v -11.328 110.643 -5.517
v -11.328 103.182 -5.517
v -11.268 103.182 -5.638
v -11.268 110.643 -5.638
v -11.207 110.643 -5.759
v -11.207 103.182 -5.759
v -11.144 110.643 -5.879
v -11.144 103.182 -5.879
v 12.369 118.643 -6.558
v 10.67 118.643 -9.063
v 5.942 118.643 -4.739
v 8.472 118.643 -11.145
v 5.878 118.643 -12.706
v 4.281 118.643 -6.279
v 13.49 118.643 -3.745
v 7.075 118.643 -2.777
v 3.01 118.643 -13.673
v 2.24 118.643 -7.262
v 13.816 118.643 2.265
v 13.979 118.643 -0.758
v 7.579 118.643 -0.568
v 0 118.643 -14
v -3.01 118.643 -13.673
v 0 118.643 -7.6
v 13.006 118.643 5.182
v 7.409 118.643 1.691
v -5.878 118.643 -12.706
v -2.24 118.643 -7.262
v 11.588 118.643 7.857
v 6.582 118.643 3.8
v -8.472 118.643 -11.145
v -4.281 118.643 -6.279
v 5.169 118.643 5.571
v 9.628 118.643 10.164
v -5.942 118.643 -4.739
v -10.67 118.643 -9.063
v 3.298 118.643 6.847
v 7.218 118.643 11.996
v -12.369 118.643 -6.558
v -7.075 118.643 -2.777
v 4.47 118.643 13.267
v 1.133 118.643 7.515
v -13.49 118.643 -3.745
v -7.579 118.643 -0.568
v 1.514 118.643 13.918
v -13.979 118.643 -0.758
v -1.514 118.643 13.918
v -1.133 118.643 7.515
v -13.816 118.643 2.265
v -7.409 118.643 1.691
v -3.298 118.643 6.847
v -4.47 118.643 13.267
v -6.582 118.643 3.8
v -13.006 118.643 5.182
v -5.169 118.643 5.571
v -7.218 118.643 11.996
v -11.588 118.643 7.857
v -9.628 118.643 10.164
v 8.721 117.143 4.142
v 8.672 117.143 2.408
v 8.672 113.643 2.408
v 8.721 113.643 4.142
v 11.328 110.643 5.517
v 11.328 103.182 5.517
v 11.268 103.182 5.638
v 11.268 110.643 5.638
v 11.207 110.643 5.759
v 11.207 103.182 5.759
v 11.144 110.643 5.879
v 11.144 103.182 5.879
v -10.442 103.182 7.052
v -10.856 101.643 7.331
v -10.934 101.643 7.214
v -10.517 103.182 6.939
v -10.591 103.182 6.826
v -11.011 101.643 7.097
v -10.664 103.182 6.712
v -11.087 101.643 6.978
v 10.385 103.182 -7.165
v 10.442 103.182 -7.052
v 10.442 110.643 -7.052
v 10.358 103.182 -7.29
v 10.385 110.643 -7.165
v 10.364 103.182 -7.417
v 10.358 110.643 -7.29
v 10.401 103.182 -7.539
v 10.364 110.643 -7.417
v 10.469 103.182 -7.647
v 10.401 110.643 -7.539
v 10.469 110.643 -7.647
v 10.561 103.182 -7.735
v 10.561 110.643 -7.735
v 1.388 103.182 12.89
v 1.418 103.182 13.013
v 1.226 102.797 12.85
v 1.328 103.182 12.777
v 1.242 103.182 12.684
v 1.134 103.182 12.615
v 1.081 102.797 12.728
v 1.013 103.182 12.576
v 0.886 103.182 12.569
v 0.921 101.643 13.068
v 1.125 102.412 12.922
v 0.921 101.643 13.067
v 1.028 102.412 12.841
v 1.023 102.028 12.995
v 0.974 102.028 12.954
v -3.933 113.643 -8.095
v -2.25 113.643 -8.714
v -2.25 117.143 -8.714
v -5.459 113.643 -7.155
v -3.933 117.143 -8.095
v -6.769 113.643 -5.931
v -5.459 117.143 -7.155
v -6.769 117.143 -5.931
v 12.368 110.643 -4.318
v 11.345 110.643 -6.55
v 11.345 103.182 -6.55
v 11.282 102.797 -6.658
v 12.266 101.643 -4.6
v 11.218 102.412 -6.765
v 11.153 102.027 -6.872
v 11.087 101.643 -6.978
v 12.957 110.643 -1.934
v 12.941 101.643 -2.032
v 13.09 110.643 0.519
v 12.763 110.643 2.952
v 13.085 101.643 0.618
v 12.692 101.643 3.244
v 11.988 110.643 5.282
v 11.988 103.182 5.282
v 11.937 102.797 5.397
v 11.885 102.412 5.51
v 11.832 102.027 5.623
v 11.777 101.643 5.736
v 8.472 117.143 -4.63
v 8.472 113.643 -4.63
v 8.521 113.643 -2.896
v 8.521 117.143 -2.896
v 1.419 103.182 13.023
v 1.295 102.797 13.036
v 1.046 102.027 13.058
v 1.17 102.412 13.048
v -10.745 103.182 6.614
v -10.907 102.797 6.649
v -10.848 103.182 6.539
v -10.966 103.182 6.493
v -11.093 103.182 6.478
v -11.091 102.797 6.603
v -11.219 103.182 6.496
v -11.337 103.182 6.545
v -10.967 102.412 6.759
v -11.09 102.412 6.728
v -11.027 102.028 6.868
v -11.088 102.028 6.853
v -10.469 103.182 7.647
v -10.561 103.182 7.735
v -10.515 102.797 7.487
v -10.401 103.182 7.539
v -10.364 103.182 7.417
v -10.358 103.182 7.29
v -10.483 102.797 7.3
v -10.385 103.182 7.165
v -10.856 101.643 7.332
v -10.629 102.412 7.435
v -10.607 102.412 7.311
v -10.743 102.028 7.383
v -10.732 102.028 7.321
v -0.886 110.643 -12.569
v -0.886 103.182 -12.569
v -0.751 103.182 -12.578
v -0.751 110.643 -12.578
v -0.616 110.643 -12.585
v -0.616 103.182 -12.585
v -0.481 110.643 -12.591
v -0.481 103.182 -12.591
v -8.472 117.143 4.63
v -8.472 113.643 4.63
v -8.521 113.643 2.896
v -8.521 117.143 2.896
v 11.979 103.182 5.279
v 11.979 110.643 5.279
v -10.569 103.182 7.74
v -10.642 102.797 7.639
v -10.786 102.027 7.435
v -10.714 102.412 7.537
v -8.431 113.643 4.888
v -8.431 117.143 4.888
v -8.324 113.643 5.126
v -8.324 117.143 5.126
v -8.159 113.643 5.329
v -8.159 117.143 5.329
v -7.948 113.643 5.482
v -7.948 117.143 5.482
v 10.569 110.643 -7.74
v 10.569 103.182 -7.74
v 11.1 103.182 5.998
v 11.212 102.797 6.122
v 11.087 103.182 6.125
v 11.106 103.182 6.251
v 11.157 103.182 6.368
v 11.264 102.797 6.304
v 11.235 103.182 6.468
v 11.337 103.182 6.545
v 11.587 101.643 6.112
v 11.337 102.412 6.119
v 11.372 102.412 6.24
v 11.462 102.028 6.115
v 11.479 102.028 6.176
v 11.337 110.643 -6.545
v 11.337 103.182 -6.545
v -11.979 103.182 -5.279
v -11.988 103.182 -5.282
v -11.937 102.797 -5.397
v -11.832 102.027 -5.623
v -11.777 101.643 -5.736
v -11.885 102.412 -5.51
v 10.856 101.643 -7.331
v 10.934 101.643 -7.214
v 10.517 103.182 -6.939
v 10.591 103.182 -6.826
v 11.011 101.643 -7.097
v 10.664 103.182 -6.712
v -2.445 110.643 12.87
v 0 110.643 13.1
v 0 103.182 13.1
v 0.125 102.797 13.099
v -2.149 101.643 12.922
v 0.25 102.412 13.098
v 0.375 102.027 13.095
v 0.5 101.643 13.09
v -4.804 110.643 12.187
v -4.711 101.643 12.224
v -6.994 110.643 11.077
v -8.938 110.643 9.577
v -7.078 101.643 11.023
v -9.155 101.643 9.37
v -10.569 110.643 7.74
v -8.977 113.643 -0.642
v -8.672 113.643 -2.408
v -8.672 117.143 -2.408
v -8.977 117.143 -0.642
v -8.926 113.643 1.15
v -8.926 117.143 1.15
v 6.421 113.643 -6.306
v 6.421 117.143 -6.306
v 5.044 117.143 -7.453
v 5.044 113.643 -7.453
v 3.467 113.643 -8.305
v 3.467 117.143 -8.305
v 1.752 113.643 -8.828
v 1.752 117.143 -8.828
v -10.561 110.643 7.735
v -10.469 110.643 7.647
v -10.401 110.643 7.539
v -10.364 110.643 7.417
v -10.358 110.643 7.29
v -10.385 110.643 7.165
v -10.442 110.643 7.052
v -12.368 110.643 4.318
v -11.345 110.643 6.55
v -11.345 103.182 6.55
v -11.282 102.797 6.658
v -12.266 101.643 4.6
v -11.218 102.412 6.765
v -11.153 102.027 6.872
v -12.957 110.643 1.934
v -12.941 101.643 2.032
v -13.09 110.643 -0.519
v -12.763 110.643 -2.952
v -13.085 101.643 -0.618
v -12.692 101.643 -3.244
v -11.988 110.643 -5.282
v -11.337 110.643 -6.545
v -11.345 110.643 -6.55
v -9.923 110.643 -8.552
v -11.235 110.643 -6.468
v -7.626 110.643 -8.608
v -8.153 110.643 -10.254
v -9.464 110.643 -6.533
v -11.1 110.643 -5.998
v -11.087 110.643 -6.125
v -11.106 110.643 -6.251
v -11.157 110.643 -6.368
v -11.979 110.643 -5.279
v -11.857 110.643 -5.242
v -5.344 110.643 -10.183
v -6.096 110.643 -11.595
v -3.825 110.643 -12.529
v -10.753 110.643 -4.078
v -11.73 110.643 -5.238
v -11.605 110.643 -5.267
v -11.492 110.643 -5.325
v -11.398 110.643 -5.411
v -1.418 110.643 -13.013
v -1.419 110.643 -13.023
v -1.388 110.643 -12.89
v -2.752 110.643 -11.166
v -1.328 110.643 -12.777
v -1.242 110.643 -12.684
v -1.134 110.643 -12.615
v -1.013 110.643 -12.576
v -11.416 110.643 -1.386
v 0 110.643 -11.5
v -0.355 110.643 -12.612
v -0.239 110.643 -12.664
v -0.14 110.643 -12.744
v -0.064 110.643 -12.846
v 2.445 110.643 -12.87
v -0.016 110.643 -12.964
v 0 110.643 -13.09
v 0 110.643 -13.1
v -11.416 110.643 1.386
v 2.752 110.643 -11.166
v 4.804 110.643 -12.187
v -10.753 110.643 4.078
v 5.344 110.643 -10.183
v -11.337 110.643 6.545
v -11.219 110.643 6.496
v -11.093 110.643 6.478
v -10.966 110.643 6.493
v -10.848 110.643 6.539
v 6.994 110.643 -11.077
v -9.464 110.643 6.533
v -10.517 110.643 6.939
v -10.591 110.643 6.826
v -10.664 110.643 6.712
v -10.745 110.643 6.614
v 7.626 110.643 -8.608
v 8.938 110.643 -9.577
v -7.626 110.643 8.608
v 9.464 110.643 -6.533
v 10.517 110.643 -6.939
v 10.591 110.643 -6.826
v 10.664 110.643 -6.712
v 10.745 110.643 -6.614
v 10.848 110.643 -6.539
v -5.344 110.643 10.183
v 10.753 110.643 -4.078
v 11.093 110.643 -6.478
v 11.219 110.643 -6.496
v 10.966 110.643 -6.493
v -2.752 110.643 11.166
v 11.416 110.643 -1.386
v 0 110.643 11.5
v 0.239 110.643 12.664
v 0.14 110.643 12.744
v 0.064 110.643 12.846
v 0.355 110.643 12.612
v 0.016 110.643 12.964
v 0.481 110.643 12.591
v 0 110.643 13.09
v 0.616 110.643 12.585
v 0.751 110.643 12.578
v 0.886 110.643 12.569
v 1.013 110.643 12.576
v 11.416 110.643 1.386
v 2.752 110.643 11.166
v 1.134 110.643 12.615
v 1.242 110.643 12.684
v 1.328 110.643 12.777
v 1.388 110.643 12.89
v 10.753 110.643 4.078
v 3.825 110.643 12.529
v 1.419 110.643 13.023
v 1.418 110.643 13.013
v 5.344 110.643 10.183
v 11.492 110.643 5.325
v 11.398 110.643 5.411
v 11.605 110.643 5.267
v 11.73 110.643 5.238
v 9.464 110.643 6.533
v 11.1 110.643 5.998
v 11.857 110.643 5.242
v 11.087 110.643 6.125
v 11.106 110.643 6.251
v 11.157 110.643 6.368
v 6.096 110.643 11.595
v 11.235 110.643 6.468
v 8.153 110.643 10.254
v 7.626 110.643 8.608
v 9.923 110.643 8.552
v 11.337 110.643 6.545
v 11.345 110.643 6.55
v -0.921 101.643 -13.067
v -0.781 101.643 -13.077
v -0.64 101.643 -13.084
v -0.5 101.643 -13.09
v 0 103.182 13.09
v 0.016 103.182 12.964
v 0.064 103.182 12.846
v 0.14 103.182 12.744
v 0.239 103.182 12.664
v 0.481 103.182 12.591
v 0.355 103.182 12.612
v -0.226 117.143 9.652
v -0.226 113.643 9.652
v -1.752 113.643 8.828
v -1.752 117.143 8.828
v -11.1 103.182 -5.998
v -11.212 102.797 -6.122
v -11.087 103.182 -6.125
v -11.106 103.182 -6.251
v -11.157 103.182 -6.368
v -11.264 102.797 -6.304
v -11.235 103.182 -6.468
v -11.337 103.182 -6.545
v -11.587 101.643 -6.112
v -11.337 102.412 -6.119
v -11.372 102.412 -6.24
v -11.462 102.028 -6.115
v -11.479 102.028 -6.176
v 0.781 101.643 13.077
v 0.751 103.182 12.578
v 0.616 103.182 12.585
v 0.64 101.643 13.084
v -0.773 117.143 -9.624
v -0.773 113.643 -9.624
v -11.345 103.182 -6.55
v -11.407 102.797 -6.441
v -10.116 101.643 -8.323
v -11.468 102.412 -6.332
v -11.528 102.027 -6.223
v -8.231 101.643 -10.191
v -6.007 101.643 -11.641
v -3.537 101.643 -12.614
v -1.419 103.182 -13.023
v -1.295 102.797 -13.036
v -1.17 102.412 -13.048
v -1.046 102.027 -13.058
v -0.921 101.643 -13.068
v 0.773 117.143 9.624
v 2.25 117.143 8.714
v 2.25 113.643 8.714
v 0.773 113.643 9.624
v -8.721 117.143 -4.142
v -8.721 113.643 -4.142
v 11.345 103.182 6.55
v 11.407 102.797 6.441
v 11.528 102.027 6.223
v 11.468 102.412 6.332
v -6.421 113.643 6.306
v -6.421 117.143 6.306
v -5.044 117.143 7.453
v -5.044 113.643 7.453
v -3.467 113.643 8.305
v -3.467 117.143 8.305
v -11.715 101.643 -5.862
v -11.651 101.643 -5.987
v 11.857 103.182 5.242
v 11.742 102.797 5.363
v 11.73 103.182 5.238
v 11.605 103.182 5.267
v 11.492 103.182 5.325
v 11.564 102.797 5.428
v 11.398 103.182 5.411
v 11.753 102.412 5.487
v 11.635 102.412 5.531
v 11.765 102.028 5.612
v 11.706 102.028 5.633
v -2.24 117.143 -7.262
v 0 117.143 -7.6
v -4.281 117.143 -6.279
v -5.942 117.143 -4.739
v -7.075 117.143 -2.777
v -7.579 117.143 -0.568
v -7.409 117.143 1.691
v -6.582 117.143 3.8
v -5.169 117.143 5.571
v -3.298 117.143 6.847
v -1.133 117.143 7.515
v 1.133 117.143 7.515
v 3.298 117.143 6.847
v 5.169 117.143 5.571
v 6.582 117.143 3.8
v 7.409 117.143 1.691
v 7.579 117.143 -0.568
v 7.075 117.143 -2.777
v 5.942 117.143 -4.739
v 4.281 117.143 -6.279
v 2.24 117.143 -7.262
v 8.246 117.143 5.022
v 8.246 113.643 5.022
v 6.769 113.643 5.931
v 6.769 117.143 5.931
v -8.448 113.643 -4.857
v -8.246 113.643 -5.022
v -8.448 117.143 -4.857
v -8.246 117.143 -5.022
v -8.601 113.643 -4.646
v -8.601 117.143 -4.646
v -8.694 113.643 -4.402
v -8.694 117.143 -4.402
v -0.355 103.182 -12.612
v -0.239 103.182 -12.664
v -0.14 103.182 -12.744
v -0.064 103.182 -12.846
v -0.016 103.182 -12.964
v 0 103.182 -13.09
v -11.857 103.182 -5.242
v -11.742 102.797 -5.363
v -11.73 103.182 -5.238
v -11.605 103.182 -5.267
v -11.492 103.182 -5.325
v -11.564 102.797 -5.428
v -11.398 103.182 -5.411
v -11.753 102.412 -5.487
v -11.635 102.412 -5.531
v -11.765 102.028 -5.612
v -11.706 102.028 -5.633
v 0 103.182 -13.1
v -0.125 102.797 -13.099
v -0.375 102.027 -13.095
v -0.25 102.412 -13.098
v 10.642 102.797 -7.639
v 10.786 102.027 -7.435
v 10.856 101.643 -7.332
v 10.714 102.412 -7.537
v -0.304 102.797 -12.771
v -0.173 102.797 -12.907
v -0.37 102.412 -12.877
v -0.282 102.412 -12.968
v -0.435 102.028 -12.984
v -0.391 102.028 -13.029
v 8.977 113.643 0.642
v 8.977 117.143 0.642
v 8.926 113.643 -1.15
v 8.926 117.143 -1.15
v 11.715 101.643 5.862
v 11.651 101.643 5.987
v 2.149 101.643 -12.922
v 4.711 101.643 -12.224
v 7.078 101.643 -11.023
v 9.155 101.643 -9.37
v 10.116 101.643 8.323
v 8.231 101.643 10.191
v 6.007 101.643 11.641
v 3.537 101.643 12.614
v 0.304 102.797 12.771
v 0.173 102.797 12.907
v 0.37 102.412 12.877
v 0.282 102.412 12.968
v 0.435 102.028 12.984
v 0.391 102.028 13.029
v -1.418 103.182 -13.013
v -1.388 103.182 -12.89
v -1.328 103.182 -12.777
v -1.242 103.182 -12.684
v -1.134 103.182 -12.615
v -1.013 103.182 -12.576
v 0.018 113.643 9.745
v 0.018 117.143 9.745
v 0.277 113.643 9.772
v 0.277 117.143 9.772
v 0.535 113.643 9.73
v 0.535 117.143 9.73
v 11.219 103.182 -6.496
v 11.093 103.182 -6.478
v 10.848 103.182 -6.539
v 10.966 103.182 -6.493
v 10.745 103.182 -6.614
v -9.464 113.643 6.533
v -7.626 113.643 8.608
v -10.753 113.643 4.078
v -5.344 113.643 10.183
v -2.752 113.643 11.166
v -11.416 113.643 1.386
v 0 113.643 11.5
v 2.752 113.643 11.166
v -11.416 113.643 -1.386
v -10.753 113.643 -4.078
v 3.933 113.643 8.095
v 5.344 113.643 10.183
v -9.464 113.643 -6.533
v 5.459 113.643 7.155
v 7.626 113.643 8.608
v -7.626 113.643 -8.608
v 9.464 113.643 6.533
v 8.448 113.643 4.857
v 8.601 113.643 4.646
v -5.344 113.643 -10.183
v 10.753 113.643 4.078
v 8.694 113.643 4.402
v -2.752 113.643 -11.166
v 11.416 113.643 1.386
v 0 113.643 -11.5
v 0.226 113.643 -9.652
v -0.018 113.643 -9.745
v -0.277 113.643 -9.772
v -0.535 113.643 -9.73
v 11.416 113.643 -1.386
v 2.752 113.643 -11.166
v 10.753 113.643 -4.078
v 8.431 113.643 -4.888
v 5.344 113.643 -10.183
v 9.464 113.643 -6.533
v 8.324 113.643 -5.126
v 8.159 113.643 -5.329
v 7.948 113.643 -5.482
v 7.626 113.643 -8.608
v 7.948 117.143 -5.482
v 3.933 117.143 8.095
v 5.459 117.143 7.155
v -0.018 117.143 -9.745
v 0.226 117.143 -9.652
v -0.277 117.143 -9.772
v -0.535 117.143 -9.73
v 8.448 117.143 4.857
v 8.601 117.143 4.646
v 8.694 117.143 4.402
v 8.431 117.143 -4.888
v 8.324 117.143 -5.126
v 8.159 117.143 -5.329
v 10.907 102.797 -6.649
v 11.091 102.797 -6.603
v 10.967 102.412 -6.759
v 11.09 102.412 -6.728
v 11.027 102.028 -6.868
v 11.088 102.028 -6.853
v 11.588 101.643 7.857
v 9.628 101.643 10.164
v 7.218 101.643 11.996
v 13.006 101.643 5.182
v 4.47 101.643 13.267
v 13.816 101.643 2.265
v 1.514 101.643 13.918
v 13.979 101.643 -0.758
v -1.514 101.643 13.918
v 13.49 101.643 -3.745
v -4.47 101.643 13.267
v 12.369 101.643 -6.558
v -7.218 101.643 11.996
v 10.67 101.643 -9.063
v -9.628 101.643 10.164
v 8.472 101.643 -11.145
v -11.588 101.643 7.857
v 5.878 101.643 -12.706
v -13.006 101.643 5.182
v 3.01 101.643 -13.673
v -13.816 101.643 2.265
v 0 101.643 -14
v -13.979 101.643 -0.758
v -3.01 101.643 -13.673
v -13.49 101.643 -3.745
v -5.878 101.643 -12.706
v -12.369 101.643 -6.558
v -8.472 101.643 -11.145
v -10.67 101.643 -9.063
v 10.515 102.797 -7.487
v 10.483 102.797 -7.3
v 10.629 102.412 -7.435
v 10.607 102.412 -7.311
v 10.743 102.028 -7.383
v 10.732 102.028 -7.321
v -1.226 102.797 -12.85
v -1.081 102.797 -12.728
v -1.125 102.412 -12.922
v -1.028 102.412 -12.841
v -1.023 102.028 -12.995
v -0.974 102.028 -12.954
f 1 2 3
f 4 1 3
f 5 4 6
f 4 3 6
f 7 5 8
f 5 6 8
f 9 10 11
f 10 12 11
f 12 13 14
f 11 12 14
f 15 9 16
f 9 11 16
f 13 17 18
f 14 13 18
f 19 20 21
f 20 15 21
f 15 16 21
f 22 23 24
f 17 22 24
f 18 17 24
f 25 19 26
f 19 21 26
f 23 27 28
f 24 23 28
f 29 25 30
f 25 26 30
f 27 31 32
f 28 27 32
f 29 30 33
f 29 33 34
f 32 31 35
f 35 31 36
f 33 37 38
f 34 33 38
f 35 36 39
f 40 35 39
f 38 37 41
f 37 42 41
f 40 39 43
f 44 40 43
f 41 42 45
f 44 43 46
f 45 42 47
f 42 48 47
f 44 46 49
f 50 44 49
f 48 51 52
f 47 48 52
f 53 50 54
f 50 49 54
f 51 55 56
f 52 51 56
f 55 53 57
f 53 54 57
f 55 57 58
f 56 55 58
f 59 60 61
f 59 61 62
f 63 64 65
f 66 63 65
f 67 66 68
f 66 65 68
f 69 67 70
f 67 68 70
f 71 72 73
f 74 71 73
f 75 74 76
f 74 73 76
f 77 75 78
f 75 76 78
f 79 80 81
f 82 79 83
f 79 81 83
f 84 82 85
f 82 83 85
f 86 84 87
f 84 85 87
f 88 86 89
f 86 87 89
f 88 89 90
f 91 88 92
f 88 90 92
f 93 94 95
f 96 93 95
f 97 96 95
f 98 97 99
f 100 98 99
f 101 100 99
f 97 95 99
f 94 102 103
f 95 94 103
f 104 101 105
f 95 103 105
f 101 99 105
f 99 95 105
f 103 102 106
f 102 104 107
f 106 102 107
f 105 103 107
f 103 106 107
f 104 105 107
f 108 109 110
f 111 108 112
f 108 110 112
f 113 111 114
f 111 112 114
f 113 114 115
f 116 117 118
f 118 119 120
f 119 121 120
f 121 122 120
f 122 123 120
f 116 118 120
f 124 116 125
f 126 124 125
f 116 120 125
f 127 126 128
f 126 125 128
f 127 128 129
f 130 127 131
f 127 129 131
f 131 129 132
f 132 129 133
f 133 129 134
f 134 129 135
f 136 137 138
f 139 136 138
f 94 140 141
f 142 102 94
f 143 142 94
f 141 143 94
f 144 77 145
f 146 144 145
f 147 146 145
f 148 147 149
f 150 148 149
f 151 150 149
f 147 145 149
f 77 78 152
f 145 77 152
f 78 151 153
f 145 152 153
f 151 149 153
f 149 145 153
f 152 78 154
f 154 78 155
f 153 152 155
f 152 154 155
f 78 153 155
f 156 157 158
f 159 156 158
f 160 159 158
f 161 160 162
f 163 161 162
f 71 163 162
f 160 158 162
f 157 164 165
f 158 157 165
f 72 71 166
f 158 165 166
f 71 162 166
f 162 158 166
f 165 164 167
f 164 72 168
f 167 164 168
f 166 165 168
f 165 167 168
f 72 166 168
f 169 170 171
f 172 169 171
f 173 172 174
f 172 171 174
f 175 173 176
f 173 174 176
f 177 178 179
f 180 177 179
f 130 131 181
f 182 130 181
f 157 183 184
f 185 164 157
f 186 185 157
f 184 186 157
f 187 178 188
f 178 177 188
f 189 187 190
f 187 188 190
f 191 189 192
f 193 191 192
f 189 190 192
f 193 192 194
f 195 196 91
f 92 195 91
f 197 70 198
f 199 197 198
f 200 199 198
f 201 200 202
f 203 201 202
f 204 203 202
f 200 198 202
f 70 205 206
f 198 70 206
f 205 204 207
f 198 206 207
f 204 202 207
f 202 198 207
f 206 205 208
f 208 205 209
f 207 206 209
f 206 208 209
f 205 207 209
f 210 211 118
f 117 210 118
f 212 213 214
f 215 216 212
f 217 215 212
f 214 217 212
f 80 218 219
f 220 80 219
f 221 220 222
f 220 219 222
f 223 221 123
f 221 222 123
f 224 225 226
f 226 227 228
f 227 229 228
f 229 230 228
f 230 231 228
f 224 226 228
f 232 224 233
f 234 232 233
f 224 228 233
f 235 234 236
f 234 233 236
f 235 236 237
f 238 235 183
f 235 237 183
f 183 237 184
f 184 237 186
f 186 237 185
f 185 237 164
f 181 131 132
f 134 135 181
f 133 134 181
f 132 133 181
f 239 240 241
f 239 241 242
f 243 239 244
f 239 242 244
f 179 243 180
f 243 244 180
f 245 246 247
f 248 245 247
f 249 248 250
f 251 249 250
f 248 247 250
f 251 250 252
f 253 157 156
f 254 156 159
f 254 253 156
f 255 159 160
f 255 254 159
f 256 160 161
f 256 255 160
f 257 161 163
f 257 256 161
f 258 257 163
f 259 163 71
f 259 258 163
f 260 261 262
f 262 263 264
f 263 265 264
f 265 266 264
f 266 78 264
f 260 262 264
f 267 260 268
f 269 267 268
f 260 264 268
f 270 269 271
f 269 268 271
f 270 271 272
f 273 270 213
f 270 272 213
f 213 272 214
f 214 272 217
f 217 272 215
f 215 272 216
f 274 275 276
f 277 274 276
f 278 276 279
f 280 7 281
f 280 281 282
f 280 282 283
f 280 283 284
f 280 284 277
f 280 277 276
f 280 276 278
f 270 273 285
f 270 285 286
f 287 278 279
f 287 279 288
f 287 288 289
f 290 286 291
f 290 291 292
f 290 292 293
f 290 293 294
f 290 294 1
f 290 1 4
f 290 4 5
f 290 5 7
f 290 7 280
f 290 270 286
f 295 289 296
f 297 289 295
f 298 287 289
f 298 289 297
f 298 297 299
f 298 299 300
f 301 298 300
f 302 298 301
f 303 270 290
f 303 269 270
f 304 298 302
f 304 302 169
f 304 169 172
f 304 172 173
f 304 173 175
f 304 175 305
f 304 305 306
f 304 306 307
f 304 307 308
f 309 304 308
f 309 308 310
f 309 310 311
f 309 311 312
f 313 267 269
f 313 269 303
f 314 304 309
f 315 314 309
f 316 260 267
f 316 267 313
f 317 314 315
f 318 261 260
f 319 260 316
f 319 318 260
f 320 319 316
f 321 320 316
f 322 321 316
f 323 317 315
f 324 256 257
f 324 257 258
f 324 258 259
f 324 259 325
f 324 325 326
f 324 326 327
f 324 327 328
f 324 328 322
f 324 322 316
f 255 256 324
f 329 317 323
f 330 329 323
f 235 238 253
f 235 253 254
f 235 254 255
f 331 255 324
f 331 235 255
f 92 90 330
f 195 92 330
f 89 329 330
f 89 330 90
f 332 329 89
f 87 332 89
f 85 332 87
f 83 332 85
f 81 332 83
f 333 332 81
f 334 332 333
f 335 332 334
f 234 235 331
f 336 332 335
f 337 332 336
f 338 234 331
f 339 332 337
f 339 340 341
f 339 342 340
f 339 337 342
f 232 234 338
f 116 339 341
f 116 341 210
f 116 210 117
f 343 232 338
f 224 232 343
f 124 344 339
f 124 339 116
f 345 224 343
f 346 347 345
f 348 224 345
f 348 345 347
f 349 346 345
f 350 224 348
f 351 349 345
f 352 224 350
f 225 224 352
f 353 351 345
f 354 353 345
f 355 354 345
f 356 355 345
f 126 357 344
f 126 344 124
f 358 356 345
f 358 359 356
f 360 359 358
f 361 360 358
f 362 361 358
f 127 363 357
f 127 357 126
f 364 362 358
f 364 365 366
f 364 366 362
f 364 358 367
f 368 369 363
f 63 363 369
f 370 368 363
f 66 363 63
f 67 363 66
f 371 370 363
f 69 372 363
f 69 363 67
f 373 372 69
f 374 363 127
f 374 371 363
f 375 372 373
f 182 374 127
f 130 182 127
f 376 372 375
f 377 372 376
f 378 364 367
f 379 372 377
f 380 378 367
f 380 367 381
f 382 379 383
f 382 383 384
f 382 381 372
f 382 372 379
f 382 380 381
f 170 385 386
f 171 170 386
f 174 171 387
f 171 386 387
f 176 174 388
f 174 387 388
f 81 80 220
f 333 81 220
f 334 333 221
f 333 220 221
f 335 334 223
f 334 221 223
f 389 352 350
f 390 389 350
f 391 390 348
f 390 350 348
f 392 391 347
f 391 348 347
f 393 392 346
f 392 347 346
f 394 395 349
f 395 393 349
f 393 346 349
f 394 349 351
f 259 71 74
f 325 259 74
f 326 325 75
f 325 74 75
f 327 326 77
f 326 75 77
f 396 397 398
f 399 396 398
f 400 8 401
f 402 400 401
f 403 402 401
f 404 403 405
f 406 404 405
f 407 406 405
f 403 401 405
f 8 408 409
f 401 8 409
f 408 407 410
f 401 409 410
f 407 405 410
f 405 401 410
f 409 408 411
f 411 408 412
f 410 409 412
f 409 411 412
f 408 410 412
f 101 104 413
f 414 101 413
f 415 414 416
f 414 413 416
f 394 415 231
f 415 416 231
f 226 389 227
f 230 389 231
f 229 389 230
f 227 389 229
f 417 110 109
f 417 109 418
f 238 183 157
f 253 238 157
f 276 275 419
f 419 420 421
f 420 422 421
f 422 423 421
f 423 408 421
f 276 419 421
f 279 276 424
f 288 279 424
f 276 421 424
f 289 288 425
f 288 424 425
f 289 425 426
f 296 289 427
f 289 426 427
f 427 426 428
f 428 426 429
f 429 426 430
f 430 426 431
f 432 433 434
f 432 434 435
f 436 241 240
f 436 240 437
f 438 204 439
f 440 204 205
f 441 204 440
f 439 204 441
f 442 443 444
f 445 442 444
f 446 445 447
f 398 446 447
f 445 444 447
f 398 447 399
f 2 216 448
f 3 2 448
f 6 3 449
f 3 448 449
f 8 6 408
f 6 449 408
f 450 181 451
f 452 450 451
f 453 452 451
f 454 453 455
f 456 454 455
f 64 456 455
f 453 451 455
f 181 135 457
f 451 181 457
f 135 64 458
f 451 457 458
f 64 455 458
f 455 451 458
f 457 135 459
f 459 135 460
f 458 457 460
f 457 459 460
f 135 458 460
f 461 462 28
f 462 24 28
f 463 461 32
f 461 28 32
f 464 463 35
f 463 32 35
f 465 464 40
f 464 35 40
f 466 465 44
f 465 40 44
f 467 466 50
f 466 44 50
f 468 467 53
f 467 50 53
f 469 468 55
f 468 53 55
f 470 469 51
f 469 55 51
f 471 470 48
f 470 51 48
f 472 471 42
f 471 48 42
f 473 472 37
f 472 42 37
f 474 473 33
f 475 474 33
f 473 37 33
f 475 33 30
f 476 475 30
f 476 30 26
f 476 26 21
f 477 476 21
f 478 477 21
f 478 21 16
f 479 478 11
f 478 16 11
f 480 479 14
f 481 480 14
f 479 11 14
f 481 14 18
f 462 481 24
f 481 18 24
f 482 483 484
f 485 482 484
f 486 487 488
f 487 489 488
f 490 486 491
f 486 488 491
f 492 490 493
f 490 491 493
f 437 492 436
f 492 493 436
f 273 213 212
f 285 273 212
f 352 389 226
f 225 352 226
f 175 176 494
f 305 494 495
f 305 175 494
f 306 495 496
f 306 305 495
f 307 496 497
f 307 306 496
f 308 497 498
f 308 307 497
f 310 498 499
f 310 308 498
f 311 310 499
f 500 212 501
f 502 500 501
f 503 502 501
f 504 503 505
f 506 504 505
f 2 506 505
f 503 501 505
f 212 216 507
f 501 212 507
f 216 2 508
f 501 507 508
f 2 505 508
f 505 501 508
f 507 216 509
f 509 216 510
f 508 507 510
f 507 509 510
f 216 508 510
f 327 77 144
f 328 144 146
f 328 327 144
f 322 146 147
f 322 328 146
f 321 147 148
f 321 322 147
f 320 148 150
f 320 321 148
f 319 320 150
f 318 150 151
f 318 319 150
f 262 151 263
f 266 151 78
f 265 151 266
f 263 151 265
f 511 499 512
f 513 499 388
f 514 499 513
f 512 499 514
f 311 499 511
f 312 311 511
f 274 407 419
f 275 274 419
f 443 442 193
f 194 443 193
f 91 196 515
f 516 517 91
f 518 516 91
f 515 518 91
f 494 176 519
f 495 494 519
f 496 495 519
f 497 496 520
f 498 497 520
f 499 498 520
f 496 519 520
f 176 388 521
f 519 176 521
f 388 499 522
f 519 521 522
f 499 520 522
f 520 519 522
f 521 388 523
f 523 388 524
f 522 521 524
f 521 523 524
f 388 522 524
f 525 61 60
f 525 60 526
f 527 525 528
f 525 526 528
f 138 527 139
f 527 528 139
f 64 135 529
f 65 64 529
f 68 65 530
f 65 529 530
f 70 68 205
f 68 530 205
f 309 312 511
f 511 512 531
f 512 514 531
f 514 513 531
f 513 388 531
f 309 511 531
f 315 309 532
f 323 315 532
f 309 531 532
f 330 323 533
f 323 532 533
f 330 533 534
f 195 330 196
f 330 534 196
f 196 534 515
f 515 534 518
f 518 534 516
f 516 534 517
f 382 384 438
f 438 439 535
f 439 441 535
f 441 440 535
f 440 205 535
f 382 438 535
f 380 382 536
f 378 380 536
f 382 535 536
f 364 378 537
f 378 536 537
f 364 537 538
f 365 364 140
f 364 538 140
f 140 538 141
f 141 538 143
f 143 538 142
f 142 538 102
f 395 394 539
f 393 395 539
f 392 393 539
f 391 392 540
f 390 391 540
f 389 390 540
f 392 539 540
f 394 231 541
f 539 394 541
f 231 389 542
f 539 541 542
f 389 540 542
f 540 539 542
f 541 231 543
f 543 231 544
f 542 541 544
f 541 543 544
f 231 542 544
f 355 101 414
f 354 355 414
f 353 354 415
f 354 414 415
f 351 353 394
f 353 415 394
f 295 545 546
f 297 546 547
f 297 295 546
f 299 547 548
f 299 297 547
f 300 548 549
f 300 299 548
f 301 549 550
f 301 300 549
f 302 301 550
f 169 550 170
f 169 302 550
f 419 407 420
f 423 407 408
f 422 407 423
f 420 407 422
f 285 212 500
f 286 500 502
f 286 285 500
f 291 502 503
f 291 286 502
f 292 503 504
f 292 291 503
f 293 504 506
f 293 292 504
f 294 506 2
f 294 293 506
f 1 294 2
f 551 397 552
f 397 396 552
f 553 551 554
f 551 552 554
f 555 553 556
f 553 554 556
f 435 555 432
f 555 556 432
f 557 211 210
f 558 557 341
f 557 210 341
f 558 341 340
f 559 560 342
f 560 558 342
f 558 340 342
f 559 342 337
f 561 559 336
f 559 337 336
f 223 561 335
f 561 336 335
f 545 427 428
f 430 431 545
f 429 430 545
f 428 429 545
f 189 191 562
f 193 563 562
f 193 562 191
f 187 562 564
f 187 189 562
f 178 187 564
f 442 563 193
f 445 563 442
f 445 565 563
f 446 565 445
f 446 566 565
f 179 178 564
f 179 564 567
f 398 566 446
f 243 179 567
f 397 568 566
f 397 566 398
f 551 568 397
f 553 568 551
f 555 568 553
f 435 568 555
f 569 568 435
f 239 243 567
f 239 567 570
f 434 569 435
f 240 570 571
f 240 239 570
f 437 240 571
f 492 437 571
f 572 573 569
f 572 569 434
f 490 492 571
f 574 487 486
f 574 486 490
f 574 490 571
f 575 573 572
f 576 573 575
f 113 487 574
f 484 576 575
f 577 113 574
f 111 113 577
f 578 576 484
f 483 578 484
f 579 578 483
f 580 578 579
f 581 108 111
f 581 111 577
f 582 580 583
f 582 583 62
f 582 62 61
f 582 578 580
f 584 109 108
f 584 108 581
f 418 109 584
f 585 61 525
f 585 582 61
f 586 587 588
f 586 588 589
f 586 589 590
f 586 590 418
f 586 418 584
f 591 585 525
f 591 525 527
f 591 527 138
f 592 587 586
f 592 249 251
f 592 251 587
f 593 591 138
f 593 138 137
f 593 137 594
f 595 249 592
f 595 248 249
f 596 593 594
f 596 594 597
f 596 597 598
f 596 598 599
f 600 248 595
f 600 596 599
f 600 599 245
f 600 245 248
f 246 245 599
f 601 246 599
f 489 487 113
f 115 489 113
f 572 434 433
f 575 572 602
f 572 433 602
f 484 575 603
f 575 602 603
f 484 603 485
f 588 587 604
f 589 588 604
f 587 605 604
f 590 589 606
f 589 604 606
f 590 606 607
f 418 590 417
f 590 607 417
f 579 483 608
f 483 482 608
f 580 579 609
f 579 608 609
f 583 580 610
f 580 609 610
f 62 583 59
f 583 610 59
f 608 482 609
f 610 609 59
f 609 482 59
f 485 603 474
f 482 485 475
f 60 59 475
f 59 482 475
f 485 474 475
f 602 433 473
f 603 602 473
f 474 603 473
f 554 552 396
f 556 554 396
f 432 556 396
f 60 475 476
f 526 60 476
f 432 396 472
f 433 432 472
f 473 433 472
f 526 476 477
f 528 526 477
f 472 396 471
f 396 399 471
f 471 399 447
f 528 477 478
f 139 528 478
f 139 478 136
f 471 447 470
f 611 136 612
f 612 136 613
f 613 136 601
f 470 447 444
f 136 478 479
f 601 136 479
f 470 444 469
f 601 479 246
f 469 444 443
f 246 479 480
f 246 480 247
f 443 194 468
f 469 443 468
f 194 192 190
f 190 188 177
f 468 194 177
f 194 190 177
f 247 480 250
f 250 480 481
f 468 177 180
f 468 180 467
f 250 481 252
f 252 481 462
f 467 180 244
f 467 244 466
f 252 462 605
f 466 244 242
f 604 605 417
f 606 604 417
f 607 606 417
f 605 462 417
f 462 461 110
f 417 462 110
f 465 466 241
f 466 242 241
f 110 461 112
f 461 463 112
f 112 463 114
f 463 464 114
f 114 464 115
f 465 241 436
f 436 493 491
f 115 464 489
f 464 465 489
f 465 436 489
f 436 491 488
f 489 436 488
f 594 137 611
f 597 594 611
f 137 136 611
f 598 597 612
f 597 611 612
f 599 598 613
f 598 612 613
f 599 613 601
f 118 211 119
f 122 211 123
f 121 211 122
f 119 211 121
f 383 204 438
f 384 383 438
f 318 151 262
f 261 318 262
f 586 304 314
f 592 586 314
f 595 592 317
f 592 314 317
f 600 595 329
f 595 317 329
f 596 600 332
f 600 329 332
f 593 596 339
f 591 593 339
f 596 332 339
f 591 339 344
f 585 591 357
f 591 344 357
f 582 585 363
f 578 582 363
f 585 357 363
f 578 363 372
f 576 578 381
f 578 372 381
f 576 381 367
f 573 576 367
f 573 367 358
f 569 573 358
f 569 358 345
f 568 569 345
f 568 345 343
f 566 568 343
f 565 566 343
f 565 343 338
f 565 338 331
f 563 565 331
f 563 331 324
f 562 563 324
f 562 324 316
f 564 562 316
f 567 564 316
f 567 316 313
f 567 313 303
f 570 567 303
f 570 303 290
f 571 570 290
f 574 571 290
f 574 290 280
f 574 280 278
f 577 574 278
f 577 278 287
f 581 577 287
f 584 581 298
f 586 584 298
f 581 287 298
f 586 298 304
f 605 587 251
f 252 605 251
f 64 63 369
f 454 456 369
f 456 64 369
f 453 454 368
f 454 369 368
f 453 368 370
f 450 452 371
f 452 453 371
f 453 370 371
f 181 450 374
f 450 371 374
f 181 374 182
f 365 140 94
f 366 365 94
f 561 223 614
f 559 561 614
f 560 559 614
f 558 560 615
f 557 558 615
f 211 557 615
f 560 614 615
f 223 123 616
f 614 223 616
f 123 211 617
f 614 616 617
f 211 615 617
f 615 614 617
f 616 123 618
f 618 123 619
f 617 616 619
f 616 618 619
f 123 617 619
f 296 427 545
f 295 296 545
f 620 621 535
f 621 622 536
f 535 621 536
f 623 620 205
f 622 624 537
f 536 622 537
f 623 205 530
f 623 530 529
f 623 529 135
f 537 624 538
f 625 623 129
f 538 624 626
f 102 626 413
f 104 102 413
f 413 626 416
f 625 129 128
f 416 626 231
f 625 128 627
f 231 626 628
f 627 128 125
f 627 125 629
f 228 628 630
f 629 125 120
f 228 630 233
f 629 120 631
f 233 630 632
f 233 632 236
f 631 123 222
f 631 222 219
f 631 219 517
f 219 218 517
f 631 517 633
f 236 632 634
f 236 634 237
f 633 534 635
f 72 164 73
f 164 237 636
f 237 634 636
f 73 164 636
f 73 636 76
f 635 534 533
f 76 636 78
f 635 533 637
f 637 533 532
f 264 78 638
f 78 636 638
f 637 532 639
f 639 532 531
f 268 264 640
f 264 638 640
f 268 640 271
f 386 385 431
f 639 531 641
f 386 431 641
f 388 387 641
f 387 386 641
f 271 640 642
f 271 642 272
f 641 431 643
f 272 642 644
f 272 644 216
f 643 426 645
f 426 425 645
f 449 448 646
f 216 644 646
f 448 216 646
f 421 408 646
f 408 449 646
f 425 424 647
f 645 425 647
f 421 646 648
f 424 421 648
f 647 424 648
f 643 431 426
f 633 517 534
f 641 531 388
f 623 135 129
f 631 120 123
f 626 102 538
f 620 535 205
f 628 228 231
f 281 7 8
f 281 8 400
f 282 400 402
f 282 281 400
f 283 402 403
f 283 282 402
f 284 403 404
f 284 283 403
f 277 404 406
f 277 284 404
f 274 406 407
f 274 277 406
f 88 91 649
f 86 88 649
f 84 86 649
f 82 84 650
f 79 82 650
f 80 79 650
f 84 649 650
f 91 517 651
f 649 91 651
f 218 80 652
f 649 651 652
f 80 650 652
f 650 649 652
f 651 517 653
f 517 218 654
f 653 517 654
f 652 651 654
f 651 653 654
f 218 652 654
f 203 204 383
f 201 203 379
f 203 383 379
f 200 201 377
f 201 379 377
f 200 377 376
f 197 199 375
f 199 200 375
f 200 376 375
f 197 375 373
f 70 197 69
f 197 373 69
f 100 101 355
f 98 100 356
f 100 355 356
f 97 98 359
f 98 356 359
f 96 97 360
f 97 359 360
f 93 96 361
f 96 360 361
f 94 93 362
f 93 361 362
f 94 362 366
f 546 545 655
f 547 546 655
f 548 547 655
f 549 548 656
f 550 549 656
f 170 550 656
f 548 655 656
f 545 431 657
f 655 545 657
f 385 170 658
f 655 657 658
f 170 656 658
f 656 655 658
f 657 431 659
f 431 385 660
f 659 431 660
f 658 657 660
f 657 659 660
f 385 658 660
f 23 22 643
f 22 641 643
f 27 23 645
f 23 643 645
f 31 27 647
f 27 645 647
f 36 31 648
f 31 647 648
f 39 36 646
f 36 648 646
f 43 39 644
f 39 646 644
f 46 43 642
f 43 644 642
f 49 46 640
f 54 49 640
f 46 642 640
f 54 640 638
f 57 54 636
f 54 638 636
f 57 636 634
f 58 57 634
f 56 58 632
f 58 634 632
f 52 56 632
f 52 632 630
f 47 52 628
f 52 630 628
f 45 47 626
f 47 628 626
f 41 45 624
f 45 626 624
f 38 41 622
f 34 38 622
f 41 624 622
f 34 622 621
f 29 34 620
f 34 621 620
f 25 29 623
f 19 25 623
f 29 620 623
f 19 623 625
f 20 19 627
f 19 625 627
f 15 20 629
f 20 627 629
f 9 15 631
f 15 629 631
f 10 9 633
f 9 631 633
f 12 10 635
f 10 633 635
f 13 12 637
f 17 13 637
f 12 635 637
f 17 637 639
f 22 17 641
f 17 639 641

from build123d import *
from OCP.BRepFilletAPI import BRepFilletAPI_MakeChamfer

# Parameters (mm, degrees)
CUT_EXTRUDE_1_DEPTH  = 15.5
SKETCH_4_R           = 11.5
CUT_EXTRUDE_9_DEPTH  = 12
CUT_EXTRUDE_10_DEPTH = 9
FILLET_1_R           = 1
FILLET_2_R           = 0.5
CHAMFER_1_SIZE       = 1.538841769
CHAMFER_1_SIZE_2     = 0.5


with BuildPart() as part:
    # Эскиз1 → Повернуть1 (revolve)
    with BuildSketch(Plane.XY, mode=Mode.PRIVATE) as revolve_1_sk:
        Polygon((7.6, 118.642857143), (14, 118.642857143), (14, 101.642857143), (9, 101.642857143), (9, 117.142857143), (7.6, 117.142857143), align=None)
    revolve(revolve_1_sk.sketch.rotate(Axis((0, 0, 0), (0, 1, 0)), 90), axis=Axis((0, 0, 0), (0, 1, 0)))

    # Эскиз2 → Вырез-Вытянуть1 (cut)
    with BuildSketch(Plane.XZ.offset(-101.642857143)):
        Polygon((0.281764878, 9.926426441), (-8.455655027, 5.207228763), (-8.737419906, -4.719197678), (-0.281764878, -9.926426441), (8.455655027, -5.207228763), (8.737419906, 4.719197678), align=None)
    extrude(amount=-CUT_EXTRUDE_1_DEPTH, mode=Mode.SUBTRACT)

    # Эскиз4 → Вырез-Вытянуть9 (cut)
    with BuildSketch(Plane.XZ.offset(-101.642857143)):
        with Locations(Location((0, 0, 0), (0, 0, 270))):
            Circle(SKETCH_4_R)
    extrude(amount=-CUT_EXTRUDE_9_DEPTH, mode=Mode.SUBTRACT)

    # Эскиз5 → Вырез-Вытянуть10 (cut)
    with BuildSketch(Plane.XZ.offset(-101.642857143)):
        with BuildLine():
            Line((0, 12.6), (0, 13.1))
            ThreePointArc((0, 13.1), (-5.924928182, 11.683545097), (-10.568574903, 7.740492524))
            Line((-10.568574903, 7.740492524), (-10.165194182, 7.445053878))
            ThreePointArc((-10.165194182, 7.445053878), (-10.554097478, 6.882661289), (-10.911920088, 6.3))
            Line((-10.911920088, 6.3), (-11.34493279, 6.55))
            ThreePointArc((-11.34493279, 6.55), (-13.080710951, 0.710634227), (-11.987750615, -5.282408086))
            Line((-11.987750615, -5.282408086), (-11.530202882, -5.080789457))
            ThreePointArc((-11.530202882, -5.080789457), (-11.237608261, -5.698785885), (-10.911920088, -6.3))
            Line((-10.911920088, -6.3), (-11.34493279, -6.55))
            ThreePointArc((-11.34493279, -6.55), (-7.155782769, -10.97291087), (-1.419175712, -13.02290061))
            Line((-1.419175712, -13.02290061), (-1.3650087, -12.525843335))
            ThreePointArc((-1.3650087, -12.525843335), (-0.683510783, -12.581447175), (0, -12.6))
            Line((0, -12.6), (0, -13.1))
            ThreePointArc((0, -13.1), (5.924928182, -11.683545097), (10.568574903, -7.740492524))
            Line((10.568574903, -7.740492524), (10.165194182, -7.445053878))
            ThreePointArc((10.165194182, -7.445053878), (10.554097478, -6.882661289), (10.911920088, -6.3))
            Line((10.911920088, -6.3), (11.34493279, -6.55))
            ThreePointArc((11.34493279, -6.55), (13.080710951, -0.710634227), (11.987750615, 5.282408086))
            Line((11.987750615, 5.282408086), (11.530202882, 5.080789457))
            ThreePointArc((11.530202882, 5.080789457), (11.237608261, 5.698785885), (10.911920088, 6.3))
            Line((10.911920088, 6.3), (11.34493279, 6.55))
            ThreePointArc((11.34493279, 6.55), (7.155782769, 10.97291087), (1.419175712, 13.02290061))
            Line((1.419175712, 13.02290061), (1.3650087, 12.525843335))
            ThreePointArc((1.3650087, 12.525843335), (0.683510783, 12.581447175), (0, 12.6))
        make_face()
    extrude(amount=-CUT_EXTRUDE_10_DEPTH, mode=Mode.SUBTRACT)

    # Скругление1
    fillet_1_edges = [part.edges().sort_by_distance(p)[0] for p in [
        (-8.455655027, 115.392857143, 5.207228763),
        (0.281764878, 115.392857143, 9.926426441),
        (8.737419906, 115.392857143, 4.719197678),
        (8.455655027, 115.392857143, -5.207228763),
        (-0.281764878, 115.392857143, -9.926426441),
        (-8.737419906, 115.392857143, -4.719197678),
    ]]
    fillet(fillet_1_edges, radius=FILLET_1_R)

    # Скругление2
    fillet_2_edges = [part.edges().sort_by_distance(p)[0] for p in [
        (0, 106.142857143, 12.6),
        (1.3650087, 106.142857143, 12.525843335),
        (10.911920088, 106.142857143, 6.3),
        (11.530202882, 106.142857143, 5.080789457),
        (10.911920088, 106.142857143, -6.3),
        (10.165194182, 106.142857143, -7.445053878),
        (0, 106.142857143, -12.6),
        (-1.3650087, 106.142857143, -12.525843335),
        (-10.911920088, 106.142857143, -6.3),
        (-11.530202882, 106.142857143, -5.080789457),
        (-10.911920088, 106.142857143, 6.3),
        (-10.165194182, 106.142857143, 7.445053878),
    ]]
    fillet(fillet_2_edges, radius=FILLET_2_R)

    # Фаска1
    chamfer_1_edges_1 = [part.edges().sort_by_distance(p)[0] for p in [
        (-10.564724448, 101.642857143, 7.737672426),
    ]]
    chamfer_1_side_1 = [part.faces().sort_by_distance(p)[0] for p in [
        (-10.564724448, 101.652857143, 7.737672426),
    ]]
    chamfer_1_edges_2 = [part.edges().sort_by_distance(p)[0] for p in [
        (-11.983383111, 101.642857143, -5.280483543),
    ]]
    chamfer_1_side_2 = [part.faces().sort_by_distance(p)[0] for p in [
        (-11.983383111, 101.652857143, -5.280483543),
    ]]
    chamfer_1_edges_3 = [part.edges().sort_by_distance(p)[0] for p in [
        (-1.418658663, 101.642857143, -13.018155968),
    ]]
    chamfer_1_side_3 = [part.faces().sort_by_distance(p)[0] for p in [
        (-1.418658663, 101.652857143, -13.018155968),
    ]]
    chamfer_1_edges_4 = [part.edges().sort_by_distance(p)[0] for p in [
        (10.564724448, 101.642857143, -7.737672426),
    ]]
    chamfer_1_side_4 = [part.faces().sort_by_distance(p)[0] for p in [
        (10.564724448, 101.652857143, -7.737672426),
    ]]
    chamfer_1_edges_5 = [part.edges().sort_by_distance(p)[0] for p in [
        (11.983383111, 101.642857143, 5.280483543),
    ]]
    chamfer_1_side_5 = [part.faces().sort_by_distance(p)[0] for p in [
        (11.983383111, 101.652857143, 5.280483543),
    ]]
    chamfer_1_edges_6 = [part.edges().sort_by_distance(p)[0] for p in [
        (1.418658663, 101.642857143, 13.018155968),
    ]]
    chamfer_1_side_6 = [part.faces().sort_by_distance(p)[0] for p in [
        (1.418658663, 101.652857143, 13.018155968),
    ]]
    chamfer_1_edges_7 = [part.edges().sort_by_distance(p)[0] for p in [
        (10.554097478, 101.642857143, -6.882661289),
    ]]
    chamfer_1_side_7 = [part.faces().sort_by_distance(p)[0] for p in [
        (10.554097478, 101.652857143, -6.882661289),
    ]]
    chamfer_1_edges_8 = [part.edges().sort_by_distance(p)[0] for p in [
        (0.683510783, 101.642857143, 12.581447175),
    ]]
    chamfer_1_side_8 = [part.faces().sort_by_distance(p)[0] for p in [
        (0.683510783, 101.652857143, 12.581447175),
    ]]
    chamfer_1_edges_9 = [part.edges().sort_by_distance(p)[0] for p in [
        (11.340799483, 101.642857143, 6.547613634),
    ]]
    chamfer_1_side_9 = [part.faces().sort_by_distance(p)[0] for p in [
        (11.340799483, 101.652857143, 6.547613634),
    ]]
    chamfer_1_edges_10 = [part.edges().sort_by_distance(p)[0] for p in [
        (11.237608261, 101.642857143, 5.698785885),
    ]]
    chamfer_1_side_10 = [part.faces().sort_by_distance(p)[0] for p in [
        (11.237608261, 101.652857143, 5.698785885),
    ]]
    chamfer_1_edges_11 = [part.edges().sort_by_distance(p)[0] for p in [
        (11.340799483, 101.642857143, -6.547613634),
    ]]
    chamfer_1_side_11 = [part.faces().sort_by_distance(p)[0] for p in [
        (11.340799483, 101.652857143, -6.547613634),
    ]]
    chamfer_1_edges_12 = [part.edges().sort_by_distance(p)[0] for p in [
        (0, 101.642857143, -13.095227269),
    ]]
    chamfer_1_side_12 = [part.faces().sort_by_distance(p)[0] for p in [
        (0, 101.652857143, -13.095227269),
    ]]
    chamfer_1_edges_13 = [part.edges().sort_by_distance(p)[0] for p in [
        (-0.683510783, 101.642857143, -12.581447175),
    ]]
    chamfer_1_side_13 = [part.faces().sort_by_distance(p)[0] for p in [
        (-0.683510783, 101.652857143, -12.581447175),
    ]]
    chamfer_1_edges_14 = [part.edges().sort_by_distance(p)[0] for p in [
        (-11.340799483, 101.642857143, -6.547613634),
    ]]
    chamfer_1_side_14 = [part.faces().sort_by_distance(p)[0] for p in [
        (-11.340799483, 101.652857143, -6.547613634),
    ]]
    chamfer_1_edges_15 = [part.edges().sort_by_distance(p)[0] for p in [
        (-11.237608261, 101.642857143, -5.698785885),
    ]]
    chamfer_1_side_15 = [part.faces().sort_by_distance(p)[0] for p in [
        (-11.237608261, 101.652857143, -5.698785885),
    ]]
    chamfer_1_edges_16 = [part.edges().sort_by_distance(p)[0] for p in [
        (-11.340799483, 101.642857143, 6.547613634),
    ]]
    chamfer_1_side_16 = [part.faces().sort_by_distance(p)[0] for p in [
        (-11.340799483, 101.652857143, 6.547613634),
    ]]
    chamfer_1_edges_17 = [part.edges().sort_by_distance(p)[0] for p in [
        (-10.554097478, 101.642857143, 6.882661289),
    ]]
    chamfer_1_side_17 = [part.faces().sort_by_distance(p)[0] for p in [
        (-10.554097478, 101.652857143, 6.882661289),
    ]]
    chamfer_1_edges_18 = [part.edges().sort_by_distance(p)[0] for p in [
        (0, 101.642857143, 13.095227269),
    ]]
    chamfer_1_side_18 = [part.faces().sort_by_distance(p)[0] for p in [
        (0, 101.652857143, 13.095227269),
    ]]
    chamfer_1_edges_19 = [part.edges().sort_by_distance(p)[0] for p in [
        (0.139762589, 101.642857143, 12.74371399),
    ]]
    chamfer_1_side_19 = [part.faces().sort_by_distance(p)[0] for p in [
        (0.139762589, 101.652857143, 12.74371399),
    ]]
    chamfer_1_edges_20 = [part.edges().sort_by_distance(p)[0] for p in [
        (1.241637792, 101.642857143, 12.683852547),
    ]]
    chamfer_1_side_20 = [part.faces().sort_by_distance(p)[0] for p in [
        (1.241637792, 101.652857143, 12.683852547),
    ]]
    chamfer_1_edges_21 = [part.edges().sort_by_distance(p)[0] for p in [
        (11.106261348, 101.642857143, 6.250819042),
    ]]
    chamfer_1_side_21 = [part.faces().sort_by_distance(p)[0] for p in [
        (11.106261348, 101.652857143, 6.250819042),
    ]]
    chamfer_1_edges_22 = [part.edges().sort_by_distance(p)[0] for p in [
        (11.605357419, 101.642857143, 5.266636403),
    ]]
    chamfer_1_side_22 = [part.faces().sort_by_distance(p)[0] for p in [
        (11.605357419, 101.652857143, 5.266636403),
    ]]
    chamfer_1_edges_23 = [part.edges().sort_by_distance(p)[0] for p in [
        (-10.966498759, 101.642857143, 6.492894947),
    ]]
    chamfer_1_side_23 = [part.faces().sort_by_distance(p)[0] for p in [
        (-10.966498759, 101.652857143, 6.492894947),
    ]]
    chamfer_1_edges_24 = [part.edges().sort_by_distance(p)[0] for p in [
        (-10.363719627, 101.642857143, 7.417216143),
    ]]
    chamfer_1_side_24 = [part.faces().sort_by_distance(p)[0] for p in [
        (-10.363719627, 101.652857143, 7.417216143),
    ]]
    chamfer_1_edges_25 = [part.edges().sort_by_distance(p)[0] for p in [
        (-11.605357419, 101.642857143, -5.266636403),
    ]]
    chamfer_1_side_25 = [part.faces().sort_by_distance(p)[0] for p in [
        (-11.605357419, 101.652857143, -5.266636403),
    ]]
    chamfer_1_edges_26 = [part.edges().sort_by_distance(p)[0] for p in [
        (-11.106261348, 101.642857143, -6.250819042),
    ]]
    chamfer_1_side_26 = [part.faces().sort_by_distance(p)[0] for p in [
        (-11.106261348, 101.652857143, -6.250819042),
    ]]
    chamfer_1_edges_27 = [part.edges().sort_by_distance(p)[0] for p in [
        (-0.139762589, 101.642857143, -12.74371399),
    ]]
    chamfer_1_side_27 = [part.faces().sort_by_distance(p)[0] for p in [
        (-0.139762589, 101.652857143, -12.74371399),
    ]]
    chamfer_1_edges_28 = [part.edges().sort_by_distance(p)[0] for p in [
        (-1.241637792, 101.642857143, -12.683852547),
    ]]
    chamfer_1_side_28 = [part.faces().sort_by_distance(p)[0] for p in [
        (-1.241637792, 101.652857143, -12.683852547),
    ]]
    chamfer_1_edges_29 = [part.edges().sort_by_distance(p)[0] for p in [
        (10.966498759, 101.642857143, -6.492894947),
    ]]
    chamfer_1_side_29 = [part.faces().sort_by_distance(p)[0] for p in [
        (10.966498759, 101.652857143, -6.492894947),
    ]]
    chamfer_1_edges_30 = [part.edges().sort_by_distance(p)[0] for p in [
        (10.363719627, 101.642857143, -7.417216143),
    ]]
    chamfer_1_side_30 = [part.faces().sort_by_distance(p)[0] for p in [
        (10.363719627, 101.652857143, -7.417216143),
    ]]
    chamfer_1 = BRepFilletAPI_MakeChamfer(part.part.solid().wrapped)
    for e in chamfer_1_edges_1:
        chamfer_1.Add(CHAMFER_1_SIZE - 0.0001, CHAMFER_1_SIZE_2 - 0.0001, e.wrapped, chamfer_1_side_1[0].wrapped)
    for e in chamfer_1_edges_2:
        chamfer_1.Add(CHAMFER_1_SIZE - 0.0001, CHAMFER_1_SIZE_2 - 0.0001, e.wrapped, chamfer_1_side_2[0].wrapped)
    for e in chamfer_1_edges_3:
        chamfer_1.Add(CHAMFER_1_SIZE - 0.0001, CHAMFER_1_SIZE_2 - 0.0001, e.wrapped, chamfer_1_side_3[0].wrapped)
    for e in chamfer_1_edges_4:
        chamfer_1.Add(CHAMFER_1_SIZE - 0.0001, CHAMFER_1_SIZE_2 - 0.0001, e.wrapped, chamfer_1_side_4[0].wrapped)
    for e in chamfer_1_edges_5:
        chamfer_1.Add(CHAMFER_1_SIZE - 0.0001, CHAMFER_1_SIZE_2 - 0.0001, e.wrapped, chamfer_1_side_5[0].wrapped)
    for e in chamfer_1_edges_6:
        chamfer_1.Add(CHAMFER_1_SIZE - 0.0001, CHAMFER_1_SIZE_2 - 0.0001, e.wrapped, chamfer_1_side_6[0].wrapped)
    for e in chamfer_1_edges_7:
        chamfer_1.Add(CHAMFER_1_SIZE - 0.0001, CHAMFER_1_SIZE_2 - 0.0001, e.wrapped, chamfer_1_side_7[0].wrapped)
    for e in chamfer_1_edges_8:
        chamfer_1.Add(CHAMFER_1_SIZE - 0.0001, CHAMFER_1_SIZE_2 - 0.0001, e.wrapped, chamfer_1_side_8[0].wrapped)
    for e in chamfer_1_edges_9:
        chamfer_1.Add(CHAMFER_1_SIZE - 0.0001, CHAMFER_1_SIZE_2 - 0.0001, e.wrapped, chamfer_1_side_9[0].wrapped)
    for e in chamfer_1_edges_10:
        chamfer_1.Add(CHAMFER_1_SIZE - 0.0001, CHAMFER_1_SIZE_2 - 0.0001, e.wrapped, chamfer_1_side_10[0].wrapped)
    for e in chamfer_1_edges_11:
        chamfer_1.Add(CHAMFER_1_SIZE - 0.0001, CHAMFER_1_SIZE_2 - 0.0001, e.wrapped, chamfer_1_side_11[0].wrapped)
    for e in chamfer_1_edges_12:
        chamfer_1.Add(CHAMFER_1_SIZE - 0.0001, CHAMFER_1_SIZE_2 - 0.0001, e.wrapped, chamfer_1_side_12[0].wrapped)
    for e in chamfer_1_edges_13:
        chamfer_1.Add(CHAMFER_1_SIZE - 0.0001, CHAMFER_1_SIZE_2 - 0.0001, e.wrapped, chamfer_1_side_13[0].wrapped)
    for e in chamfer_1_edges_14:
        chamfer_1.Add(CHAMFER_1_SIZE - 0.0001, CHAMFER_1_SIZE_2 - 0.0001, e.wrapped, chamfer_1_side_14[0].wrapped)
    for e in chamfer_1_edges_15:
        chamfer_1.Add(CHAMFER_1_SIZE - 0.0001, CHAMFER_1_SIZE_2 - 0.0001, e.wrapped, chamfer_1_side_15[0].wrapped)
    for e in chamfer_1_edges_16:
        chamfer_1.Add(CHAMFER_1_SIZE - 0.0001, CHAMFER_1_SIZE_2 - 0.0001, e.wrapped, chamfer_1_side_16[0].wrapped)
    for e in chamfer_1_edges_17:
        chamfer_1.Add(CHAMFER_1_SIZE - 0.0001, CHAMFER_1_SIZE_2 - 0.0001, e.wrapped, chamfer_1_side_17[0].wrapped)
    for e in chamfer_1_edges_18:
        chamfer_1.Add(CHAMFER_1_SIZE - 0.0001, CHAMFER_1_SIZE_2 - 0.0001, e.wrapped, chamfer_1_side_18[0].wrapped)
    for e in chamfer_1_edges_19:
        chamfer_1.Add(CHAMFER_1_SIZE - 0.0001, CHAMFER_1_SIZE_2 - 0.0001, e.wrapped, chamfer_1_side_19[0].wrapped)
    for e in chamfer_1_edges_20:
        chamfer_1.Add(CHAMFER_1_SIZE - 0.0001, CHAMFER_1_SIZE_2 - 0.0001, e.wrapped, chamfer_1_side_20[0].wrapped)
    for e in chamfer_1_edges_21:
        chamfer_1.Add(CHAMFER_1_SIZE - 0.0001, CHAMFER_1_SIZE_2 - 0.0001, e.wrapped, chamfer_1_side_21[0].wrapped)
    for e in chamfer_1_edges_22:
        chamfer_1.Add(CHAMFER_1_SIZE - 0.0001, CHAMFER_1_SIZE_2 - 0.0001, e.wrapped, chamfer_1_side_22[0].wrapped)
    for e in chamfer_1_edges_23:
        chamfer_1.Add(CHAMFER_1_SIZE - 0.0001, CHAMFER_1_SIZE_2 - 0.0001, e.wrapped, chamfer_1_side_23[0].wrapped)
    for e in chamfer_1_edges_24:
        chamfer_1.Add(CHAMFER_1_SIZE - 0.0001, CHAMFER_1_SIZE_2 - 0.0001, e.wrapped, chamfer_1_side_24[0].wrapped)
    for e in chamfer_1_edges_25:
        chamfer_1.Add(CHAMFER_1_SIZE - 0.0001, CHAMFER_1_SIZE_2 - 0.0001, e.wrapped, chamfer_1_side_25[0].wrapped)
    for e in chamfer_1_edges_26:
        chamfer_1.Add(CHAMFER_1_SIZE - 0.0001, CHAMFER_1_SIZE_2 - 0.0001, e.wrapped, chamfer_1_side_26[0].wrapped)
    for e in chamfer_1_edges_27:
        chamfer_1.Add(CHAMFER_1_SIZE - 0.0001, CHAMFER_1_SIZE_2 - 0.0001, e.wrapped, chamfer_1_side_27[0].wrapped)
    for e in chamfer_1_edges_28:
        chamfer_1.Add(CHAMFER_1_SIZE - 0.0001, CHAMFER_1_SIZE_2 - 0.0001, e.wrapped, chamfer_1_side_28[0].wrapped)
    for e in chamfer_1_edges_29:
        chamfer_1.Add(CHAMFER_1_SIZE - 0.0001, CHAMFER_1_SIZE_2 - 0.0001, e.wrapped, chamfer_1_side_29[0].wrapped)
    for e in chamfer_1_edges_30:
        chamfer_1.Add(CHAMFER_1_SIZE - 0.0001, CHAMFER_1_SIZE_2 - 0.0001, e.wrapped, chamfer_1_side_30[0].wrapped)
    add(Compound.cast(chamfer_1.Shape()), mode=Mode.REPLACE)  # a hair under: the kernel refuses the full size


solid = part.part
